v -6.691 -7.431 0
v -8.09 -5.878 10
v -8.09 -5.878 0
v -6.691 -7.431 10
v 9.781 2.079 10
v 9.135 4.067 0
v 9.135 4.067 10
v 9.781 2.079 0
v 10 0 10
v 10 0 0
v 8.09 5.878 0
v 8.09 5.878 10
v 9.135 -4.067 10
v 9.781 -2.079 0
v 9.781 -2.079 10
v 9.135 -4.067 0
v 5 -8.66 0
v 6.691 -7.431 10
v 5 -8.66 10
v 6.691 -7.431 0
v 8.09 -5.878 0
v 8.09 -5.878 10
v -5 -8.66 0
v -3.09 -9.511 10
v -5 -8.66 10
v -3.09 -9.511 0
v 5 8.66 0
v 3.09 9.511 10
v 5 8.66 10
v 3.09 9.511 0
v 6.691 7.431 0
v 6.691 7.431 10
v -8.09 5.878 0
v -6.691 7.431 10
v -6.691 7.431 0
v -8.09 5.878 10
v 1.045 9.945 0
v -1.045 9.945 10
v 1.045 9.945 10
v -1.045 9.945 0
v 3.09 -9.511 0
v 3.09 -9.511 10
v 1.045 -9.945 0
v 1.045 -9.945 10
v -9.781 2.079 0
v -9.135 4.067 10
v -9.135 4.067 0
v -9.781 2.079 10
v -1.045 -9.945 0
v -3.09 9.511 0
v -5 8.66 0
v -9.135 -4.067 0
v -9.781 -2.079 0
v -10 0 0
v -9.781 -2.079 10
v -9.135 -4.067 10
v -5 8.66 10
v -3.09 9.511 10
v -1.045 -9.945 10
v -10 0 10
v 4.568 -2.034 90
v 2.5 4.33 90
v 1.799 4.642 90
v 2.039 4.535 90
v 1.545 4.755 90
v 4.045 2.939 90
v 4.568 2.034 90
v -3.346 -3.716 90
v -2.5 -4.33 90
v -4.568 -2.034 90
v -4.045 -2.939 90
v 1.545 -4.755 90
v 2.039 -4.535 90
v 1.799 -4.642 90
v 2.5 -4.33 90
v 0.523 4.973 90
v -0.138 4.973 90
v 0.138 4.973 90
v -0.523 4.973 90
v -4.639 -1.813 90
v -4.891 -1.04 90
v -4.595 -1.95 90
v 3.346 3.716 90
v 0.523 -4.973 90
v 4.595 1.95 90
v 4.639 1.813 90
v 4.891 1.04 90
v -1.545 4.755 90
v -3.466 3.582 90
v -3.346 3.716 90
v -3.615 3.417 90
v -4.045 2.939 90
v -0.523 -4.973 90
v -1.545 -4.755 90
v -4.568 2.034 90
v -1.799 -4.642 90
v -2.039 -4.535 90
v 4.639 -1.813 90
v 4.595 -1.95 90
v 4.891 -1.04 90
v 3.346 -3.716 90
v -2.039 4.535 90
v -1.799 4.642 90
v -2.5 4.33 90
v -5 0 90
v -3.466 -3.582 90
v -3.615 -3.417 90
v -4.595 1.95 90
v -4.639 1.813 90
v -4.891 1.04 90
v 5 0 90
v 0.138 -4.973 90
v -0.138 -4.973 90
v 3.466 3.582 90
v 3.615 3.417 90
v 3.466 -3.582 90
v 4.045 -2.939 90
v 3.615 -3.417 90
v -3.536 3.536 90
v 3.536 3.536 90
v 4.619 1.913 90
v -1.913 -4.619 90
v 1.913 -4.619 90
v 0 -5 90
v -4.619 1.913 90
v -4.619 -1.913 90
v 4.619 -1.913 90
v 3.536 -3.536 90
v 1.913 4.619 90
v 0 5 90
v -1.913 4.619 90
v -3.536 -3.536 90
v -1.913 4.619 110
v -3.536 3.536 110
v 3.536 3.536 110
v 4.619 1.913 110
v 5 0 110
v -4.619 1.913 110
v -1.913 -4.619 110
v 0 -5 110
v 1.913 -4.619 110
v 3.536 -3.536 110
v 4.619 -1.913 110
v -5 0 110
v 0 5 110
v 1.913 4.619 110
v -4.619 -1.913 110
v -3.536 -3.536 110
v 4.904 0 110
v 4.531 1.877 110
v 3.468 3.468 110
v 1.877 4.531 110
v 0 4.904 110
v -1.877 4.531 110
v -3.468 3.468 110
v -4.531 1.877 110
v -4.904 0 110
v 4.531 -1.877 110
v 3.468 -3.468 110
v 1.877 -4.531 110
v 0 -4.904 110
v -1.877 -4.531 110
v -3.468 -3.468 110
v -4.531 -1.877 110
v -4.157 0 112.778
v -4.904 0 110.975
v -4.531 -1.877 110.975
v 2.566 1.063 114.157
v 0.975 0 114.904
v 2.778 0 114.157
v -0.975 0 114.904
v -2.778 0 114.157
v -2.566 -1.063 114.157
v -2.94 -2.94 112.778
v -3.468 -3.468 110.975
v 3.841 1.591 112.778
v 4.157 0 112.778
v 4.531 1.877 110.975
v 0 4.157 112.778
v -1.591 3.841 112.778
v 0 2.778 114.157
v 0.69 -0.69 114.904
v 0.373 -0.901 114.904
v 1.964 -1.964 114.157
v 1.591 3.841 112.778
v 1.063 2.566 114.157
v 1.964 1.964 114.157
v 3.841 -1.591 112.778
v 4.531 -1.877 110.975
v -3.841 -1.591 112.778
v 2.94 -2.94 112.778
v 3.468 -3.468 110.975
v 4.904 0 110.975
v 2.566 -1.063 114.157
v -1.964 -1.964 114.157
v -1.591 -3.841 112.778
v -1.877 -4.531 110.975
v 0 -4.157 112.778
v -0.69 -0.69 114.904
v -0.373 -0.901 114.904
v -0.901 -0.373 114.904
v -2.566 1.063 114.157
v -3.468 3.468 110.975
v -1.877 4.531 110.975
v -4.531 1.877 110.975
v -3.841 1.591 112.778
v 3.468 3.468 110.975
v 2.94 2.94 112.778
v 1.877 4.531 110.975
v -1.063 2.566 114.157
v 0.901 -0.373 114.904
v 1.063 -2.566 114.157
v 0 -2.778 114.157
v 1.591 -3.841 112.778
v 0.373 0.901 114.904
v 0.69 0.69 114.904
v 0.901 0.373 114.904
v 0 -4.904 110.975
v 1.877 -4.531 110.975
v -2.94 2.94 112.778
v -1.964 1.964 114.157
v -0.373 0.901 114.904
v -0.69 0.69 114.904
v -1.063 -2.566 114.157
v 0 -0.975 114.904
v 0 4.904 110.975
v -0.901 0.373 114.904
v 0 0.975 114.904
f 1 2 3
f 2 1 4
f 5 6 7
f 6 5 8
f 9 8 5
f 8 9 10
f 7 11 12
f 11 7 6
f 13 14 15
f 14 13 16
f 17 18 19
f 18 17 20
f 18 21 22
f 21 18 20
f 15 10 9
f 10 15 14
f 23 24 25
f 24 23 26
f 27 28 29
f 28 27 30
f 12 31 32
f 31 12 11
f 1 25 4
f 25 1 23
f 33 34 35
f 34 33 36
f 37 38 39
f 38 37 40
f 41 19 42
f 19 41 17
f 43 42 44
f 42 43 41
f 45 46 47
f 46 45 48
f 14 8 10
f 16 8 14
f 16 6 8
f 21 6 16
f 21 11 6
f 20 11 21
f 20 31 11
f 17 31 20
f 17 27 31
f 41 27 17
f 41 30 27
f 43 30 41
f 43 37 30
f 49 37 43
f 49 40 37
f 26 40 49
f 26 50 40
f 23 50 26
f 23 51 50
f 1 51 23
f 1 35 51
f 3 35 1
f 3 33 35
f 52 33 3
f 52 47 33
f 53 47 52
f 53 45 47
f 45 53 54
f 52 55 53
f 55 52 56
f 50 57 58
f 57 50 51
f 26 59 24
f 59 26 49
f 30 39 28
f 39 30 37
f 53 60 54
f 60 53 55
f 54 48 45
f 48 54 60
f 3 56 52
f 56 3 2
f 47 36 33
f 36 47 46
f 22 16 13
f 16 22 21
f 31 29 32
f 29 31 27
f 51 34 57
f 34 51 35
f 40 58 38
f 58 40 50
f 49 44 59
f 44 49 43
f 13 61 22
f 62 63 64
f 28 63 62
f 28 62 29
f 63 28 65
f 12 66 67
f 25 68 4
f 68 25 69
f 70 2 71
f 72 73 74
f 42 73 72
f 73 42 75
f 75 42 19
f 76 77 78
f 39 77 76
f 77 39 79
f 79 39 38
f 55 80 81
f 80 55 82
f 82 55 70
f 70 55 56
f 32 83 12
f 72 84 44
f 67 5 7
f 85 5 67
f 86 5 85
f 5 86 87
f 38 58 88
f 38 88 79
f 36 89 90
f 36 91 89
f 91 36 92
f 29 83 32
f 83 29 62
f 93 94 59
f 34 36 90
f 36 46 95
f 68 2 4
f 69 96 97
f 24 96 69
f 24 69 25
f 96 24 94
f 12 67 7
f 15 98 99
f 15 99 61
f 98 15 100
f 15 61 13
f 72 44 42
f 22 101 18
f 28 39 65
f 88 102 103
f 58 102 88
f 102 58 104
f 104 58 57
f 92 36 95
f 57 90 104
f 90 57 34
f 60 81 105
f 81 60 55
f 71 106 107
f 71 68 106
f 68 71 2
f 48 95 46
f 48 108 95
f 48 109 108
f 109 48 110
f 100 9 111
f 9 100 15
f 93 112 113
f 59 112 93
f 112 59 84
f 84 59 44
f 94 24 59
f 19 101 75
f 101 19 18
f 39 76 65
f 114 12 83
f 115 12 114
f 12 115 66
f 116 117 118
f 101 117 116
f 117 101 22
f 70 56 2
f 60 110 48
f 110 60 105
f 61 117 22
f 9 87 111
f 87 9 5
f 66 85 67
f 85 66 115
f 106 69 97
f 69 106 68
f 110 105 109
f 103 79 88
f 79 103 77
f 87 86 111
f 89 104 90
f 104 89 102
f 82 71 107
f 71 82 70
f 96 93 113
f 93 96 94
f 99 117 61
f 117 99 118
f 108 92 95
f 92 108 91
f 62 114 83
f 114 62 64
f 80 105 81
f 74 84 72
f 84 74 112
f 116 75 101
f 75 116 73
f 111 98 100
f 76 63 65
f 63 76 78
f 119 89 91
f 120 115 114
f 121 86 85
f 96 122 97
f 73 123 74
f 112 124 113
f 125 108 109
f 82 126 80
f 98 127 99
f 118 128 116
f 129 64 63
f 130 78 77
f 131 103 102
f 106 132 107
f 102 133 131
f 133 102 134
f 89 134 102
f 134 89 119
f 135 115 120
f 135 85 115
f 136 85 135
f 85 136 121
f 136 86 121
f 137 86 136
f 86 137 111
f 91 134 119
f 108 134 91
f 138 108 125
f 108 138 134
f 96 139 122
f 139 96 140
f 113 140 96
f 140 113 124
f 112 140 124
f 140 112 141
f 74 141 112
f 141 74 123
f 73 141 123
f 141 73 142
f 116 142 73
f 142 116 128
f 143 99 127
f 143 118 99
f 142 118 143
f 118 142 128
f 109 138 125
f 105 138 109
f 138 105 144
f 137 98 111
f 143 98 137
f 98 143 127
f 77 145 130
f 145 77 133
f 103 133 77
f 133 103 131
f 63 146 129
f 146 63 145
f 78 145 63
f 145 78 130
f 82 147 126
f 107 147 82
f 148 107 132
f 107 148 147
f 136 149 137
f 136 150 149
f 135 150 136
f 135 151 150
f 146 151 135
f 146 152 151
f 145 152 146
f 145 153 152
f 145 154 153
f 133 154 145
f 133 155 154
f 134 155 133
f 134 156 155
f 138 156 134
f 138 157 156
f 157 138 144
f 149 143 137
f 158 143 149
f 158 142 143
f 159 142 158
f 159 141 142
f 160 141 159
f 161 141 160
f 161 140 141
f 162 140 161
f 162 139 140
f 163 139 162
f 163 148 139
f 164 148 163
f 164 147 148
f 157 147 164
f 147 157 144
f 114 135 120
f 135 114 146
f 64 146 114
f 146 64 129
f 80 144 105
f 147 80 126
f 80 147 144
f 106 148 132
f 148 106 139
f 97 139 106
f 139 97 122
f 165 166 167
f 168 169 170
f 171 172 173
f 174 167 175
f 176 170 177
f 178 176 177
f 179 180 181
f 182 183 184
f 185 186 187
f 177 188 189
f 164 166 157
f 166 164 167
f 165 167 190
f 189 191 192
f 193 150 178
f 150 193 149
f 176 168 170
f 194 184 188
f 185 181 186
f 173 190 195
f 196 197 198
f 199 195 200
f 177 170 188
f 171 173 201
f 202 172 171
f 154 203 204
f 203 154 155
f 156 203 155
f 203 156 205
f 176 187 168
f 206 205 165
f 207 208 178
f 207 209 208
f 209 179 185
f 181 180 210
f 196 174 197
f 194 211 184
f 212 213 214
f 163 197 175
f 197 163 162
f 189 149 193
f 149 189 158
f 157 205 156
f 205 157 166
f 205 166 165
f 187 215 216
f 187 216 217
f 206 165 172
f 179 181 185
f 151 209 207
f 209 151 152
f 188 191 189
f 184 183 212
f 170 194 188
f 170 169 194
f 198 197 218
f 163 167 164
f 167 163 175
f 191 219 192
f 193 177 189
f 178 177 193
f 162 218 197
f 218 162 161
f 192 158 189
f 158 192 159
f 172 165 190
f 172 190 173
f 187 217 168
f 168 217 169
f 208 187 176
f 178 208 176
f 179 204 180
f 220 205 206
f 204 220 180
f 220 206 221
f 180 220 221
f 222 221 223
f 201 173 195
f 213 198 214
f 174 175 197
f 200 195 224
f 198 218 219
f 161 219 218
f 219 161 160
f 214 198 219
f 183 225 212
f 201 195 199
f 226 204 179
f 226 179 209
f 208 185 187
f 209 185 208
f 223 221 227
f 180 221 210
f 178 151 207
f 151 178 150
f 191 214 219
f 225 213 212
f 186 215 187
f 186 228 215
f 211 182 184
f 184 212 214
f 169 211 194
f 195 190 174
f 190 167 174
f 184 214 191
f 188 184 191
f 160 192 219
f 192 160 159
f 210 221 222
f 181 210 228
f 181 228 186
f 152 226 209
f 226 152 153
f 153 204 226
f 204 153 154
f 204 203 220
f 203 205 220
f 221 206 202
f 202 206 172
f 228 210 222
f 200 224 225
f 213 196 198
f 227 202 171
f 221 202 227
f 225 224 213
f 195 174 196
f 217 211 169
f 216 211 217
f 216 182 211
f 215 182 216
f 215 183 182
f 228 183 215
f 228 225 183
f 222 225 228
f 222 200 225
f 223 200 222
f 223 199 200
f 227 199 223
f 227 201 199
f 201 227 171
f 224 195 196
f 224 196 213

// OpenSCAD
module antenna(big_radius, small_radius, mounting_height, cone_height, upper_height){
    cylinder(r=big_radius, h=mounting_height);
    translate([0,0,mounting_height])
        cylinder(r1=big_radius, r2=small_radius, h=cone_height);
    translate([0,0,mounting_height+cone_height])
        cylinder(r=small_radius, h=upper_height);
    translate([0,0,mounting_height+cone_height+upper_height])
        sphere(r=small_radius);
}

antenna(10, 5, 10, 80, 20);
